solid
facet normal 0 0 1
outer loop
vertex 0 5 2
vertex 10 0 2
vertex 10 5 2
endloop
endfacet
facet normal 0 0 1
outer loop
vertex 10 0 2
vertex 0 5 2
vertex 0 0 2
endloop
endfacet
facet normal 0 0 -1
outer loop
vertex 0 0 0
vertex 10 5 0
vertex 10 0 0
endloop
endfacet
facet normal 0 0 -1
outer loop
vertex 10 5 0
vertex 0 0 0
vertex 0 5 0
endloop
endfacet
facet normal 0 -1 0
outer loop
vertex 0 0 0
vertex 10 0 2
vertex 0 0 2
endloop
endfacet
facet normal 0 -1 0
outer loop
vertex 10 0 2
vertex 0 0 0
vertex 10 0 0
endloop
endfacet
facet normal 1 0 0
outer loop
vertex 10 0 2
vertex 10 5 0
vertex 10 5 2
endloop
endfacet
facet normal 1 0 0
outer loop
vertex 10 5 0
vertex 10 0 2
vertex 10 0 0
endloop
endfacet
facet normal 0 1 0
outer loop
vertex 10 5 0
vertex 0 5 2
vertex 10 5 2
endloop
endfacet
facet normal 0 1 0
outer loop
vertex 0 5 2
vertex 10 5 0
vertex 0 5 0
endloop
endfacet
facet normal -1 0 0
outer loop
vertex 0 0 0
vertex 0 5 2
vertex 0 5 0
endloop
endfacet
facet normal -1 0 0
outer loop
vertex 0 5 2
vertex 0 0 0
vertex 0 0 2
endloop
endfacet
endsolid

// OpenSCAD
width = 10;
assert(width < 20, "too wide for the slot");
cube([width, 5, 2]);
